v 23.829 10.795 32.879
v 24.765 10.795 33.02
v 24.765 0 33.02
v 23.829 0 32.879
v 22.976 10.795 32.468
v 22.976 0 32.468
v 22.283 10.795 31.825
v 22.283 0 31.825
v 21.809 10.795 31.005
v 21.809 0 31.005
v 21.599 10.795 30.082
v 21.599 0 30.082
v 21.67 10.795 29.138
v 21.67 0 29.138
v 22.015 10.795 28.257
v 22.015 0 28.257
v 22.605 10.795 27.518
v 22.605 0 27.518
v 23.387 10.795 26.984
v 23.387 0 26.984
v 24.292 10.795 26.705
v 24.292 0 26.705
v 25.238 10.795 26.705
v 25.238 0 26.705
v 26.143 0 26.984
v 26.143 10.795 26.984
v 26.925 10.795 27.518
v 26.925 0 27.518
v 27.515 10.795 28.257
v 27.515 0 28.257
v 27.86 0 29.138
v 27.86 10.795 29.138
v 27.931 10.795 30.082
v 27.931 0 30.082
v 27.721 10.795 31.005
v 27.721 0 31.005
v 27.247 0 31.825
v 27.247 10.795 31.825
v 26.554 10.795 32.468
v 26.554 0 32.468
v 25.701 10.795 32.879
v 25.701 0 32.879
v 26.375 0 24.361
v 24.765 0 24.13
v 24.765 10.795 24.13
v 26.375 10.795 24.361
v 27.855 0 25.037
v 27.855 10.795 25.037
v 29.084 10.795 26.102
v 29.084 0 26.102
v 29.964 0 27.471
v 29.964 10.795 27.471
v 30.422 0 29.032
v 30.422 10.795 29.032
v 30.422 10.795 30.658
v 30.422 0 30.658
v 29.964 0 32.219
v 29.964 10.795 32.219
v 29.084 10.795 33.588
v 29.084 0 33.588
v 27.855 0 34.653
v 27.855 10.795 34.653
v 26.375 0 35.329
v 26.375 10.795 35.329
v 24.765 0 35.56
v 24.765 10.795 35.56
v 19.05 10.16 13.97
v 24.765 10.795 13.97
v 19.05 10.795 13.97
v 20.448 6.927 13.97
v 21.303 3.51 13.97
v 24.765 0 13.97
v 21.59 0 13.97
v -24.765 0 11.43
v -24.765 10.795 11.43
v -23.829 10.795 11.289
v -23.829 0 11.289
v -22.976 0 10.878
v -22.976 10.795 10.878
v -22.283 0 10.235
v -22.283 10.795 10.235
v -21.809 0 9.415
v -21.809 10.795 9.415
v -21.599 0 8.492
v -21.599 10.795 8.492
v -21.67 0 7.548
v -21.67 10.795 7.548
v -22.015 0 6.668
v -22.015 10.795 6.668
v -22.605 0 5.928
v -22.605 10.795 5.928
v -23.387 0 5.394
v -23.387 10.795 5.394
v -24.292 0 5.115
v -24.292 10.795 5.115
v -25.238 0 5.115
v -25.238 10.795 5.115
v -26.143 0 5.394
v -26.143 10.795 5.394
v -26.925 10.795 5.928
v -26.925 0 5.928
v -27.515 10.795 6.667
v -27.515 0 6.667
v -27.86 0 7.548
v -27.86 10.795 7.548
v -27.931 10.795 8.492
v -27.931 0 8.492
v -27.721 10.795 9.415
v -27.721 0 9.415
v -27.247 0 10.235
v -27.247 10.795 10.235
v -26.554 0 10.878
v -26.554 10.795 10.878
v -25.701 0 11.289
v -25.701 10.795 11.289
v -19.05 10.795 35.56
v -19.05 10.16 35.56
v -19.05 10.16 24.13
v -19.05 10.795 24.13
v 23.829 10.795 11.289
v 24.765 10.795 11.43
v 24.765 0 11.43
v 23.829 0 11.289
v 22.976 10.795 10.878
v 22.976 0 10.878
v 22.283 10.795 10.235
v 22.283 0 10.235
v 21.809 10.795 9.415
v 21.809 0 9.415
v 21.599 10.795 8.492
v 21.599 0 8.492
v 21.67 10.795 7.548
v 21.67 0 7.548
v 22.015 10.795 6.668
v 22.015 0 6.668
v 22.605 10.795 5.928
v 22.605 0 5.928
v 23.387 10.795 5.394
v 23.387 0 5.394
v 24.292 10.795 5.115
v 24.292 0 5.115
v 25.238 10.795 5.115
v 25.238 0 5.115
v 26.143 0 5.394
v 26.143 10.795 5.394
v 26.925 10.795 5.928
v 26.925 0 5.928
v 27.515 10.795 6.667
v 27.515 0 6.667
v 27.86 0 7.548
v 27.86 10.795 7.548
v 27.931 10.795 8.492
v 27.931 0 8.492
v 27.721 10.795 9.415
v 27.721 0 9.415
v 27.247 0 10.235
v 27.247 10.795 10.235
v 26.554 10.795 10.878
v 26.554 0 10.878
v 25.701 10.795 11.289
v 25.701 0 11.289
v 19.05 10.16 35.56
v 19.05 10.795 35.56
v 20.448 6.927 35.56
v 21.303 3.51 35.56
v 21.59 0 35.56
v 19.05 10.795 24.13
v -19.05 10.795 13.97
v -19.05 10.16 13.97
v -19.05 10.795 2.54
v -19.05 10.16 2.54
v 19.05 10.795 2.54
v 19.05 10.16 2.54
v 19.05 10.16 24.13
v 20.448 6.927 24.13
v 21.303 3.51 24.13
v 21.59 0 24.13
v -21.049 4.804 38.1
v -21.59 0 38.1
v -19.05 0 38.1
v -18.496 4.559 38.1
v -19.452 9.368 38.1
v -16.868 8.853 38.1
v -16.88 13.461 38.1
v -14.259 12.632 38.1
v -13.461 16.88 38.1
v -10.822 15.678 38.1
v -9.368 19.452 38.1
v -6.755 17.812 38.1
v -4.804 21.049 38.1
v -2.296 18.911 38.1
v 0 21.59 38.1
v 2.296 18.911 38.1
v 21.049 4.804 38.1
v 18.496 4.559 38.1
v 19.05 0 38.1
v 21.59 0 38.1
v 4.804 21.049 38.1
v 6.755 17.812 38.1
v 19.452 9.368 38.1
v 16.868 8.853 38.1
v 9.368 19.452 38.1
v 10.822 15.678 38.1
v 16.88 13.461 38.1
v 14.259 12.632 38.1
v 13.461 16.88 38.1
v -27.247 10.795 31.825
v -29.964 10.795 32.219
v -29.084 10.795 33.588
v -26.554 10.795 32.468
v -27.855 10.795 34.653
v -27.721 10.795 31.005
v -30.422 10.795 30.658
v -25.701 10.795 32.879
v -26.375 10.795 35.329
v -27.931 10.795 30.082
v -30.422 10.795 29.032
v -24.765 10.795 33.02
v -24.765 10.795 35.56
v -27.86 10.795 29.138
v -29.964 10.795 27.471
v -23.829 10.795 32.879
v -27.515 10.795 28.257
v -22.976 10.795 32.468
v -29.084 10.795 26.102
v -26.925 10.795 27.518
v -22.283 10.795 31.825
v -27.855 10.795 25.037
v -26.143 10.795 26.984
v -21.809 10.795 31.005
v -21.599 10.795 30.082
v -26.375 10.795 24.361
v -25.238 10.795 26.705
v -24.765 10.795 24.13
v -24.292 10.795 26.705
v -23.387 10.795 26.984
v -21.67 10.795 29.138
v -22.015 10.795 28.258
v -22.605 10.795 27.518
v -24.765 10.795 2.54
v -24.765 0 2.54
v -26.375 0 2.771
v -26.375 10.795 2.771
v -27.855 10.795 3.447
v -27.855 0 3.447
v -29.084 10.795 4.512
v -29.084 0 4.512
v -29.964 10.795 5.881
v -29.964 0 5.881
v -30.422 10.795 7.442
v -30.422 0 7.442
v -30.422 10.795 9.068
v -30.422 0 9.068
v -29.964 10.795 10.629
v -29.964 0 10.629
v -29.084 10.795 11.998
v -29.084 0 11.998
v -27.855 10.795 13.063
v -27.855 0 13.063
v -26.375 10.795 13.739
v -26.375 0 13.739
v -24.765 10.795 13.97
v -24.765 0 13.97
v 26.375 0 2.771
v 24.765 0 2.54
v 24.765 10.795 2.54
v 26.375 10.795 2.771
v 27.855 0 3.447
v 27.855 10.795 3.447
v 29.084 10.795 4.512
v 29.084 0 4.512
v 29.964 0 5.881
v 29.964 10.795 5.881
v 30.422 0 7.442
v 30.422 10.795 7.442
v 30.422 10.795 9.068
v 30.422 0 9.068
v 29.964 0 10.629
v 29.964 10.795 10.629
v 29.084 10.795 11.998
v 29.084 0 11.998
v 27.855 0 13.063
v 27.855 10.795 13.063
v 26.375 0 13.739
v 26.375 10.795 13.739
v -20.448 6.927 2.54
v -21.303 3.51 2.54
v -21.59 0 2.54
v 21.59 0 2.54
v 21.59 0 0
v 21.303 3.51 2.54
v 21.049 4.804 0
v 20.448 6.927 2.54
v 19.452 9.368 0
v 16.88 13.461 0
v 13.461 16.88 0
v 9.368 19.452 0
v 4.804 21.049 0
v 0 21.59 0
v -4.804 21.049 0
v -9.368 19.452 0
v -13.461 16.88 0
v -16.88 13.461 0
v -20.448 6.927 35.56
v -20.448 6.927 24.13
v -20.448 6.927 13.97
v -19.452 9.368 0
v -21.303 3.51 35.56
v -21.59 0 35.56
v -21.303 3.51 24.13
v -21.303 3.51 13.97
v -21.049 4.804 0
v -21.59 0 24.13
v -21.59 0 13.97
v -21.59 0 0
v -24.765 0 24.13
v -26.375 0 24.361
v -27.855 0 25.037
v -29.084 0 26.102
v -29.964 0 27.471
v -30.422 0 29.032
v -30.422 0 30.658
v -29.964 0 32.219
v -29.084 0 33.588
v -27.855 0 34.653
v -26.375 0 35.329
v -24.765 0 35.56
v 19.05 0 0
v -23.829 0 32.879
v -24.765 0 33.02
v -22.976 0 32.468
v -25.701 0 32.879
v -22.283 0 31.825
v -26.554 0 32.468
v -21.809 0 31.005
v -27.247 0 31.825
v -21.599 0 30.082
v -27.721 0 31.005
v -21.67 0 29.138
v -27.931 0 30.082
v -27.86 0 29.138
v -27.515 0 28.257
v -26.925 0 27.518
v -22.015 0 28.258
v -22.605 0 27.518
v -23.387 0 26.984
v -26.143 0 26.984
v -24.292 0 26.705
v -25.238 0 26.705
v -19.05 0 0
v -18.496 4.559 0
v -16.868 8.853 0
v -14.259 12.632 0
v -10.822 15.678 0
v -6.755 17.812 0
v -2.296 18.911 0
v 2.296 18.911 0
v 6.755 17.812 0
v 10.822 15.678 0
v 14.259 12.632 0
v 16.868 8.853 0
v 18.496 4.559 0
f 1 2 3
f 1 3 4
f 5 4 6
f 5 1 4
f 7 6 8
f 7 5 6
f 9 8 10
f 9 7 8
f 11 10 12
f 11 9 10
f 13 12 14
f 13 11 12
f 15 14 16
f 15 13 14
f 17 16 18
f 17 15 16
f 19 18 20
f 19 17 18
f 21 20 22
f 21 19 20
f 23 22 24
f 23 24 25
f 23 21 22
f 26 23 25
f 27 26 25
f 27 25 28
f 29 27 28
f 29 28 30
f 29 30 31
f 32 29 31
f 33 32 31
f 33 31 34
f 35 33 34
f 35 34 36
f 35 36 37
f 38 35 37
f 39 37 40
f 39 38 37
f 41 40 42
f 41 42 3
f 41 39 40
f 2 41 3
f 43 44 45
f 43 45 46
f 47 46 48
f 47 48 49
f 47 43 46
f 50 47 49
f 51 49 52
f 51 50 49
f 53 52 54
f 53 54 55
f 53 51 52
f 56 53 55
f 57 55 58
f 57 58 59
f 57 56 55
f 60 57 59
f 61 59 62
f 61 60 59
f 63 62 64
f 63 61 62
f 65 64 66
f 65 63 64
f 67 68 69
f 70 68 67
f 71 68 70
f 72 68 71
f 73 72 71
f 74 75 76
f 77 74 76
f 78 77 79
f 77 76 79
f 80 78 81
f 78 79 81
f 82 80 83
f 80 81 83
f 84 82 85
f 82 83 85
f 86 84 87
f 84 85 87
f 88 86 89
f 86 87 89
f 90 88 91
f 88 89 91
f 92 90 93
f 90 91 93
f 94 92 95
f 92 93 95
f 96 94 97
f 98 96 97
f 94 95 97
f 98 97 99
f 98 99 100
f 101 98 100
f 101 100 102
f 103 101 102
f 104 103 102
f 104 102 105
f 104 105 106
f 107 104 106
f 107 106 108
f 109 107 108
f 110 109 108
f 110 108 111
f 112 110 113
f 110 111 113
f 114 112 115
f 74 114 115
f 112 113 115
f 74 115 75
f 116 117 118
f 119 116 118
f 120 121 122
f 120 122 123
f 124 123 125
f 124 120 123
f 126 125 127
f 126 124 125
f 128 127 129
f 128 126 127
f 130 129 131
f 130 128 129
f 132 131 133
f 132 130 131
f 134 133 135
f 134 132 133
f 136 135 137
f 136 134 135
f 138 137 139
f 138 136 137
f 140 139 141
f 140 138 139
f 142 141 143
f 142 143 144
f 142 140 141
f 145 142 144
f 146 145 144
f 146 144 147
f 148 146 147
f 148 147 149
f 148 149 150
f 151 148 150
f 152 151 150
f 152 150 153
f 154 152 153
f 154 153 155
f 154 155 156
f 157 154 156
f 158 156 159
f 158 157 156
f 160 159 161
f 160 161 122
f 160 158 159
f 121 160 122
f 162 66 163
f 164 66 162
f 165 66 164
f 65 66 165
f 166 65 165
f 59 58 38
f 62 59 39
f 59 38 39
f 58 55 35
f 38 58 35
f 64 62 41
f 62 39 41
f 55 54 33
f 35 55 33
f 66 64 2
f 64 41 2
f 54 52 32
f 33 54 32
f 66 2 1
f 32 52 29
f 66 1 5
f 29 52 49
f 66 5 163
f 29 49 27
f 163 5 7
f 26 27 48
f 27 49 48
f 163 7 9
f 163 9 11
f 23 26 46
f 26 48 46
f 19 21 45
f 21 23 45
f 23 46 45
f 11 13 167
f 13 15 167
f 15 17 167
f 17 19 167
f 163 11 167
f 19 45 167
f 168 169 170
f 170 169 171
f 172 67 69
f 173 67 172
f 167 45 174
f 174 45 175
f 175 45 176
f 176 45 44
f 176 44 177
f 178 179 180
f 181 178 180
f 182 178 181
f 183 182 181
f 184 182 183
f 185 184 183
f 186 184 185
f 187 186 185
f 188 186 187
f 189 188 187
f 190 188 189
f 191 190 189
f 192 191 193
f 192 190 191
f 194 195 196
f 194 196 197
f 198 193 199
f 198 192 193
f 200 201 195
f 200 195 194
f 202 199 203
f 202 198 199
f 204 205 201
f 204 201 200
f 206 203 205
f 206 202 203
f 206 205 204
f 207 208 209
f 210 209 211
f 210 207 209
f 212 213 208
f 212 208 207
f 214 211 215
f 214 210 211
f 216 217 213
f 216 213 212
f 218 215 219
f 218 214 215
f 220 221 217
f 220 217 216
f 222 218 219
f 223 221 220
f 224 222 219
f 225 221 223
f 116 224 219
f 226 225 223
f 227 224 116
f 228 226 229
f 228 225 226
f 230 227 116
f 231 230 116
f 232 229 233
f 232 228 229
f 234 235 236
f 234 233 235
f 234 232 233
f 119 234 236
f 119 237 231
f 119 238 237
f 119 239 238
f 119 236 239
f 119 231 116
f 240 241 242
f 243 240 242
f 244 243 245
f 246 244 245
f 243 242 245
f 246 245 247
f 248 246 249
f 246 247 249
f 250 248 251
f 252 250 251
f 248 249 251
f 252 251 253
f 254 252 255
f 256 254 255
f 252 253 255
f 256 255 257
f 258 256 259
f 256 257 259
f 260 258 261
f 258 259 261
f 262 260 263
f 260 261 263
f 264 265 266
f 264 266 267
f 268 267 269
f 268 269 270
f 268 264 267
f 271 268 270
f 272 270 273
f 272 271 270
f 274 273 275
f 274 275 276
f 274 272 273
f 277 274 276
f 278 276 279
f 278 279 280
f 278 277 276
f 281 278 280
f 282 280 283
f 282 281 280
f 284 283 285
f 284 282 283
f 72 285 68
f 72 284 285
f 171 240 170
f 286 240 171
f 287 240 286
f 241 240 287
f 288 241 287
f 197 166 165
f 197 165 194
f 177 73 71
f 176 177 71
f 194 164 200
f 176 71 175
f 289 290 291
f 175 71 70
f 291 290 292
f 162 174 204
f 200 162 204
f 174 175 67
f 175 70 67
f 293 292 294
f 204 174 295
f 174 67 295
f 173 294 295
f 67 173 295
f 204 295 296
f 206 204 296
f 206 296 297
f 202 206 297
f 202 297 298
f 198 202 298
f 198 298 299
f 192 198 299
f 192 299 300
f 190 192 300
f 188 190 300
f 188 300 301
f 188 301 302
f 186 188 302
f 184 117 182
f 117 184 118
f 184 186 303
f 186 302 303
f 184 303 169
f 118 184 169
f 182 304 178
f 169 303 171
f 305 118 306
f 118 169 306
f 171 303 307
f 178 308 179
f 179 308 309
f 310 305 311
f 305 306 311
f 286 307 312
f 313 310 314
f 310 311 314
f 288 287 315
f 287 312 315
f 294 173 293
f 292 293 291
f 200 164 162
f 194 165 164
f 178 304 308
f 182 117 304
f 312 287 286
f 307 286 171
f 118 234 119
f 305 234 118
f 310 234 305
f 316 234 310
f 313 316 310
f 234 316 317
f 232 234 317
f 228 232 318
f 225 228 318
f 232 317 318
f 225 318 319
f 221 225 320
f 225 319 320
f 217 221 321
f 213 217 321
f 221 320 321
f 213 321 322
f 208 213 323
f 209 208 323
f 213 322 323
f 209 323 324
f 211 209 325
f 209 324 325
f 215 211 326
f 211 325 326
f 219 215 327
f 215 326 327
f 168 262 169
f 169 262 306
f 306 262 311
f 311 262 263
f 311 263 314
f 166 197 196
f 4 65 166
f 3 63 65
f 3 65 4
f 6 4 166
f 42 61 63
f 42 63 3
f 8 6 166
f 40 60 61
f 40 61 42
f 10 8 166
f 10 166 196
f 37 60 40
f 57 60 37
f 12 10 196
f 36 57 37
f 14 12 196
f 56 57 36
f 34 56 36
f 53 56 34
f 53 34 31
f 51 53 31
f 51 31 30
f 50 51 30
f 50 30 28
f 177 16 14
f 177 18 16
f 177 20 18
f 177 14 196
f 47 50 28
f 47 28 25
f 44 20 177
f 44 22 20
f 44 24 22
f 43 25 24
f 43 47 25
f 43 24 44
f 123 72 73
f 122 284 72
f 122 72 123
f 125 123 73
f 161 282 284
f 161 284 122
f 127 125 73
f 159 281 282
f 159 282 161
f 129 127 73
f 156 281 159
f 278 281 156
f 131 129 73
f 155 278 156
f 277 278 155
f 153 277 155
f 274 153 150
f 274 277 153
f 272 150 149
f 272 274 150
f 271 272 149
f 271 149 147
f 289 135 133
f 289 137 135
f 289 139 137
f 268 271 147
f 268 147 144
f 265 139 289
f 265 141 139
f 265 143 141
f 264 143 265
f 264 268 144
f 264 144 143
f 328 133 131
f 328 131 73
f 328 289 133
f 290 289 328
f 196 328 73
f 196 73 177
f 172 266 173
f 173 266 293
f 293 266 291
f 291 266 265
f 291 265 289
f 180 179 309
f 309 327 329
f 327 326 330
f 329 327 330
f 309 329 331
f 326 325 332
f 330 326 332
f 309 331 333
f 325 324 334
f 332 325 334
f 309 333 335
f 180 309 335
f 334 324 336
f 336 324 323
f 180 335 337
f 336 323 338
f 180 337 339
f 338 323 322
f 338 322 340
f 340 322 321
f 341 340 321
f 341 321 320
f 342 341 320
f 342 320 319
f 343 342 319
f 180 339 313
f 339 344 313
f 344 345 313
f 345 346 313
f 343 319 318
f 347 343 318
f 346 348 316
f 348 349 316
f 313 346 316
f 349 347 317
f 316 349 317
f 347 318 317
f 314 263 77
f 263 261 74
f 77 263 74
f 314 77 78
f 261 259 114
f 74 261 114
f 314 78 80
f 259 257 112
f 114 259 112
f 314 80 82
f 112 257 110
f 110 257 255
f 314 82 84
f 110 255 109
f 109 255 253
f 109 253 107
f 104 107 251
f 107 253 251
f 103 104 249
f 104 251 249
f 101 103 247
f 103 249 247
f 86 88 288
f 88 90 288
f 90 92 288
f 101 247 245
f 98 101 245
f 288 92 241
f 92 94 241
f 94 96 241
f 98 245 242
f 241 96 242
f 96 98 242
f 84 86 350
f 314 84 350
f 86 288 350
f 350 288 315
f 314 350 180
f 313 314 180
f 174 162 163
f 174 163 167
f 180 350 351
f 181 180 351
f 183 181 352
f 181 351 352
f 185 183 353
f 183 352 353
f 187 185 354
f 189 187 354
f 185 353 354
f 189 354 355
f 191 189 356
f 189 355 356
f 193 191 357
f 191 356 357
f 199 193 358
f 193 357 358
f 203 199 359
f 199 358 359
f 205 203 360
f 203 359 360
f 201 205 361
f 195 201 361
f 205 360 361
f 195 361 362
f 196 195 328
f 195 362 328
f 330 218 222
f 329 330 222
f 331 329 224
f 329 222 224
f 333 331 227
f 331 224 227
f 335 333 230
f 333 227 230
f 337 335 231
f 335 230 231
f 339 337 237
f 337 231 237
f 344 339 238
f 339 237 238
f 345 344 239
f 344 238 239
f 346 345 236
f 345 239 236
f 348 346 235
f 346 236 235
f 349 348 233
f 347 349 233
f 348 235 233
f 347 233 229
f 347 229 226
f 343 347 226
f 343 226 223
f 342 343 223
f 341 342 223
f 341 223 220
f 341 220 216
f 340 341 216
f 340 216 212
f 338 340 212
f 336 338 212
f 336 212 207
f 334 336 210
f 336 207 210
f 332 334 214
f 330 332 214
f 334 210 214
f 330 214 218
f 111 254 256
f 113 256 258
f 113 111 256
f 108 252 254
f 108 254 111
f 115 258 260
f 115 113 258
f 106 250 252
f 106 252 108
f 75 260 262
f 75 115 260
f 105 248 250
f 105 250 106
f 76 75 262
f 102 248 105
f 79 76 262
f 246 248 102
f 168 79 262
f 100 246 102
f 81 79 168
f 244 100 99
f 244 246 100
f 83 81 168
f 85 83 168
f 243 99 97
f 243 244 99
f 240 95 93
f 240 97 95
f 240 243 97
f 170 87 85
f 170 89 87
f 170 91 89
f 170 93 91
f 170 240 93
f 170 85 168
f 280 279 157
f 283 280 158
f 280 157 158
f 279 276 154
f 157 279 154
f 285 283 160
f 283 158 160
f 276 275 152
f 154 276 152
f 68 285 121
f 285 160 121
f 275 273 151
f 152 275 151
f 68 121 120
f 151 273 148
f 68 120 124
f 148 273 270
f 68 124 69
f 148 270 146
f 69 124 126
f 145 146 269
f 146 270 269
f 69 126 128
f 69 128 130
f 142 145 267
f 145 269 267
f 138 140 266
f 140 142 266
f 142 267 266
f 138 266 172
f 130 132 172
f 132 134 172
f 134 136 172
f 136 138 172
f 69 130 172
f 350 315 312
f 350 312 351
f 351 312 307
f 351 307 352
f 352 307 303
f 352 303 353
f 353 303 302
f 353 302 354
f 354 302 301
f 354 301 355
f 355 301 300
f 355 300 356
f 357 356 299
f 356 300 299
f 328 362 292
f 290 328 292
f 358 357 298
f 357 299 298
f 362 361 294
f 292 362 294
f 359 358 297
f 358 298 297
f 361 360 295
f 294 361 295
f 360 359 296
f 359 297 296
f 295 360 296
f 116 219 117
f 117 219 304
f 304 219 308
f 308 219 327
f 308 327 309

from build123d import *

# Parameters (mm, degrees)
BOSS_EXTRUDE2_DEPTH = 38.1
SKETCH8_R           = 5.715
BOSS_EXTRUDE3_DEPTH = 10.795
SKETCH9_W           = 5.715
SKETCH9_H           = 11.43
BOSS_EXTRUDE4_DEPTH = 10.795
SKETCH10_R          = 3.175
CUT_EXTRUDE1_DEPTH  = 10.795


with BuildPart() as part:
    # Sketch1 → Boss-Extrude2 (new body)
    with BuildSketch(Plane.XY):
        with BuildLine():
            Line((-21.59, 0), (-19.05, 0))
            ThreePointArc((-19.05, 0), (0, 19.05), (19.05, 0))
            Line((19.05, 0), (21.59, 0))
            ThreePointArc((21.59, 0), (0, 21.59), (-21.59, 0))
        make_face()
    extrude(amount=BOSS_EXTRUDE2_DEPTH)

    # Sketch8 → Boss-Extrude3 (add)
    with BuildSketch(Plane(origin=(0, 0, 0), x_dir=(1, 0, 0), z_dir=(0, 1, 0))):
        with Locations(Location((-24.765, -8.255, 0), (0, 0, 56.251011404))):
            Circle(SKETCH8_R)
        with Locations(Location((-24.765, -29.845, 0), (0, 0, 56.251011404))):
            Circle(SKETCH8_R)
    boss_extrude3 = extrude(amount=BOSS_EXTRUDE3_DEPTH)

    # Sketch9 → Boss-Extrude4 (add)
    with BuildSketch(Plane(origin=(0, 0, 0), x_dir=(1, 0, 0), z_dir=(0, 1, 0))):
        with Locations((-21.9075, -29.845)):
            Rectangle(SKETCH9_W, SKETCH9_H)
        with Locations((-21.9075, -8.255)):
            Rectangle(SKETCH9_W, SKETCH9_H)
    boss_extrude4 = extrude(amount=BOSS_EXTRUDE4_DEPTH)

    # Sketch10 → Cut-Extrude1 (cut)
    with BuildSketch(Plane(origin=(0, 10.795, 0), x_dir=(1, 0, 0), z_dir=(0, 1, 0))):
        with Locations(Location((-24.765, -29.845, 0), (0, 0, 270))):
            Circle(SKETCH10_R)
        with Locations(Location((-24.765, -8.255, 0), (0, 0, 270))):
            Circle(SKETCH10_R)
    cut_extrude1 = extrude(amount=-CUT_EXTRUDE1_DEPTH, mode=Mode.SUBTRACT)

    # Mirror1: Boss-Extrude3, Boss-Extrude4, Cut-Extrude1 across plane
    add(boss_extrude3.mirror(Plane(origin=(0, 0, 0), x_dir=(0, 0, 1), z_dir=(1, 0, 0))))
    add(boss_extrude4.mirror(Plane(origin=(0, 0, 0), x_dir=(0, 0, 1), z_dir=(1, 0, 0))))
    add(cut_extrude1.mirror(Plane(origin=(0, 0, 0), x_dir=(0, 0, 1), z_dir=(1, 0, 0))), mode=Mode.SUBTRACT)


solid = part.part
